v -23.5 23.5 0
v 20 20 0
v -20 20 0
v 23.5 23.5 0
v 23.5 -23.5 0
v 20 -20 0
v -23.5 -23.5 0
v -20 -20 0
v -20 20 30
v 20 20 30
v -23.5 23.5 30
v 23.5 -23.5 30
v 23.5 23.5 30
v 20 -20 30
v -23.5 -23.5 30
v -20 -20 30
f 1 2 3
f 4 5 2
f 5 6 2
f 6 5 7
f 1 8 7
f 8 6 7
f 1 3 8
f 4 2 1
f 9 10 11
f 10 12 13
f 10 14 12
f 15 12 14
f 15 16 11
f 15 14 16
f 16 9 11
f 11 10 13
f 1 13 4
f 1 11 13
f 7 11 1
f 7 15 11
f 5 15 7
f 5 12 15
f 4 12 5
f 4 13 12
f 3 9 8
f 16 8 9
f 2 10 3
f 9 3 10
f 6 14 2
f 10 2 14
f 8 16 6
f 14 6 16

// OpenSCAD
// Generated by SolidPython 1.0.2 on 2020-09-11 21:30:56


linear_extrude(height = 30) {
	difference() {
		square(center = true, size = 47);
		square(center = true, size = 40);
	}
}
/***********************************************
*********      SolidPython code:      **********
************************************************
 
#from .lib.grinder_base import GrinderBase

from solid import *
from solid.utils import *  # Not required, but the utils module is useful





#connector = DellConnector(x_holders=4, y_holders=2)

#scad = connector.rotate_to_print(connector.multiple_dell_holder())
#scad = connector.multiple_dell_holder()



#top = GrinderBase.custom_diameter(90, 17).platform()
#scad_render_to_file(top, "bed-base-legs_base.scad")

output_dir = "output/"

connector = linear_extrude(height=30)(square(47, center=True)-square(40, center=True))
scad_render_to_file(connector, output_dir + "coffee-connector.scad")
 
 
************************************************/
